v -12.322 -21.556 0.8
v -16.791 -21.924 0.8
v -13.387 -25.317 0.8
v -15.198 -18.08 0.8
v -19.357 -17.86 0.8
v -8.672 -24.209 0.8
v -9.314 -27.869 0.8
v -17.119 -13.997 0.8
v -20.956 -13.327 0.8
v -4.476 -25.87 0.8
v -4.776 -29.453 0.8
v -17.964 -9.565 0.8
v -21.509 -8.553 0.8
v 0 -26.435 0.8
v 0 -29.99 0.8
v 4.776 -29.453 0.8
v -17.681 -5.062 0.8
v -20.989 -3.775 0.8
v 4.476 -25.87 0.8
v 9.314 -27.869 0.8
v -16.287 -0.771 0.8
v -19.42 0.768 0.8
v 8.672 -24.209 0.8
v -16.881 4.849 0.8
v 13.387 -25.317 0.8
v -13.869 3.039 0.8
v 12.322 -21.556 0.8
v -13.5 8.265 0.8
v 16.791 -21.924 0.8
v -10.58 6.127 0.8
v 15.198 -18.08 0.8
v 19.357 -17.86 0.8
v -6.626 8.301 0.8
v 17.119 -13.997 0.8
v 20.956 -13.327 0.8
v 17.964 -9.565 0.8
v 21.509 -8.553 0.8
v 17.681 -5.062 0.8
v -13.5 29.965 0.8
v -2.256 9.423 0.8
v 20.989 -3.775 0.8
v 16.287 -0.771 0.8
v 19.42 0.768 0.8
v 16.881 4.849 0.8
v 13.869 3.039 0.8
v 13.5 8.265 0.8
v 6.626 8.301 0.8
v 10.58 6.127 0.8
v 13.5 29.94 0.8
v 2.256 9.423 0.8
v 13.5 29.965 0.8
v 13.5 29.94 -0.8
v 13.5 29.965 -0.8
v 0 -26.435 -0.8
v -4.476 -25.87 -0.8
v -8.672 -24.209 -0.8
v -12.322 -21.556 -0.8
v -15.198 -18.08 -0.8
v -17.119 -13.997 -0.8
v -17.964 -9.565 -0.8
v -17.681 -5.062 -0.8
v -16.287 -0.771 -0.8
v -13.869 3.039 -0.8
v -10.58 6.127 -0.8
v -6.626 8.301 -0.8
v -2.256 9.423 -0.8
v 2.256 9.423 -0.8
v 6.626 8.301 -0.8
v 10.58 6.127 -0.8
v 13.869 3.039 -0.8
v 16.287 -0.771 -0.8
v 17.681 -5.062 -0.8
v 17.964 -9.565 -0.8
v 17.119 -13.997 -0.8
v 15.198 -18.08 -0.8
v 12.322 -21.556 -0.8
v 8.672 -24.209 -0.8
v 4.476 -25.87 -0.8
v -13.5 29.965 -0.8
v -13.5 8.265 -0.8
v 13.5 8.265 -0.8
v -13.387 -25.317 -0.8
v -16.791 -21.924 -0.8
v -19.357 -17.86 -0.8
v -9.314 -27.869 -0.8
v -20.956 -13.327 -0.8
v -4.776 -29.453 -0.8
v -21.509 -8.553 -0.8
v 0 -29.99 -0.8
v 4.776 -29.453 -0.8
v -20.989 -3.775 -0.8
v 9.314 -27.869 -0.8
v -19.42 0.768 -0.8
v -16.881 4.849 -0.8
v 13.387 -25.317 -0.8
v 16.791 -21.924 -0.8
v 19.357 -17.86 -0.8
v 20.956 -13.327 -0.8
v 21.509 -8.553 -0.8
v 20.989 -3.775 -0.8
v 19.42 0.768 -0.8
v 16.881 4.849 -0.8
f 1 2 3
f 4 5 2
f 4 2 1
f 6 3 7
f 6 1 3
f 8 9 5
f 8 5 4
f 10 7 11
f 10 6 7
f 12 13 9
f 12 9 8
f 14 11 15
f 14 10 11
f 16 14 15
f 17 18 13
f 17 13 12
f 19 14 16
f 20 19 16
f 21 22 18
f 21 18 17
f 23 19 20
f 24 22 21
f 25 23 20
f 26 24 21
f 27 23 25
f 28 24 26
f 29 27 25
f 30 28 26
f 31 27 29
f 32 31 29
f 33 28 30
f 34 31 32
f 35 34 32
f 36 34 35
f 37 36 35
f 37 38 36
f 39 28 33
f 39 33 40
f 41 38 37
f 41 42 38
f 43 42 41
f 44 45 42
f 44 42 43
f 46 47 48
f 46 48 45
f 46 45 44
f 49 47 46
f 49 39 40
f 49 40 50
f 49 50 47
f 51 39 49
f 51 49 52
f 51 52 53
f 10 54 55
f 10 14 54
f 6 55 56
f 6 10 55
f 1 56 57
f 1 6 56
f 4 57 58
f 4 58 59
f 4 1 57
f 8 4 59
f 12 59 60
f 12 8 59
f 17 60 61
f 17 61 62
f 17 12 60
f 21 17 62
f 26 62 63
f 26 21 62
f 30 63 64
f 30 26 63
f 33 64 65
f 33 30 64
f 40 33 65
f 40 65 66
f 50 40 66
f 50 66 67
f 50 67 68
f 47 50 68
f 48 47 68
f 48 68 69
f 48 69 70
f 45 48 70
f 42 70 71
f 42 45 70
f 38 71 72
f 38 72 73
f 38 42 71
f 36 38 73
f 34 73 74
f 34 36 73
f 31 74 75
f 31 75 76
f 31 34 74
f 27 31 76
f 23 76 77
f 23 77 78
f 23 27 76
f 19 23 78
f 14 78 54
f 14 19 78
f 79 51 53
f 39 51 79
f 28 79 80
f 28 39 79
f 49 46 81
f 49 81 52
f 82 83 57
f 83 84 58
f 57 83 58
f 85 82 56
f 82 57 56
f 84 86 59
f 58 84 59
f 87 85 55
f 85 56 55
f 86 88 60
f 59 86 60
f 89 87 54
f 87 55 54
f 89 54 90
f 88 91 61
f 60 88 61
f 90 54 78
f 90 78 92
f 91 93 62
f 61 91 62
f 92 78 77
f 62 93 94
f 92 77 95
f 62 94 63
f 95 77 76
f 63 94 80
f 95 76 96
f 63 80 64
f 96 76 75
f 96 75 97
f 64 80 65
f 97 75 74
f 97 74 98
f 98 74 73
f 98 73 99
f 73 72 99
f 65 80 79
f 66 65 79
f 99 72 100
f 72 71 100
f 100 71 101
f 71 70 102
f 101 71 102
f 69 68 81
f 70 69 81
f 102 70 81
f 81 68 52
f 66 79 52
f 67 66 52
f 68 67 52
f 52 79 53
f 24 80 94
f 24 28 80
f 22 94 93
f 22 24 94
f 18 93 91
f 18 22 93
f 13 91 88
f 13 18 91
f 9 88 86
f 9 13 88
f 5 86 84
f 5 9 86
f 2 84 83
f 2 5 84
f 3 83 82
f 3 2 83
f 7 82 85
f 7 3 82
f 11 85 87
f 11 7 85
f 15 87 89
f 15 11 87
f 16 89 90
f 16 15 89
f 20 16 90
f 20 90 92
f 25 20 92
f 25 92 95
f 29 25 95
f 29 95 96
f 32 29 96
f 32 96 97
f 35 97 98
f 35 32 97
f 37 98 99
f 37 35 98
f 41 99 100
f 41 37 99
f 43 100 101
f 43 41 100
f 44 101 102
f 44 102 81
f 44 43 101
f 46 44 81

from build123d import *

# Parameters (mm, degrees)
F1_DEPTH = 0.8


# Not quite as in the source:
# - ends of sketch curves that miss each other by under 0.0002 mm in the source are joined


with BuildPart() as f1:
    # F0 (on Top) → F1 (new body, symmetric)
    with BuildSketch(Plane.XY):
        with BuildLine():
            Line((-13.5, 29.939975), (-13.5, 8.264975))
            ThreePointArc((-13.5, 8.264975), (0, -29.989975), (13.500000361, 8.2649754478))
            Line((13.500000361, 8.2649754478), (13.5, 29.939975))
            Line((13.5, 29.939975), (13.5, 29.964975))
            Line((13.5, 29.964975), (13.475, 29.964975))
            Line((13.475, 29.964975), (-13.475, 29.964975))
            Line((-13.475, 29.964975), (-13.5, 29.964975))
            Line((-13.5, 29.964975), (-13.5, 29.939975))
        make_face()
        with BuildLine():
            ThreePointArc((0, 9.564975), (18, -8.435025), (0, -26.435025))
            ThreePointArc((0, -26.435025), (-18, -8.435025), (0, 9.564975))
        make_face(mode=Mode.SUBTRACT)
    extrude(amount=F1_DEPTH, both=True)


solid = f1.part
